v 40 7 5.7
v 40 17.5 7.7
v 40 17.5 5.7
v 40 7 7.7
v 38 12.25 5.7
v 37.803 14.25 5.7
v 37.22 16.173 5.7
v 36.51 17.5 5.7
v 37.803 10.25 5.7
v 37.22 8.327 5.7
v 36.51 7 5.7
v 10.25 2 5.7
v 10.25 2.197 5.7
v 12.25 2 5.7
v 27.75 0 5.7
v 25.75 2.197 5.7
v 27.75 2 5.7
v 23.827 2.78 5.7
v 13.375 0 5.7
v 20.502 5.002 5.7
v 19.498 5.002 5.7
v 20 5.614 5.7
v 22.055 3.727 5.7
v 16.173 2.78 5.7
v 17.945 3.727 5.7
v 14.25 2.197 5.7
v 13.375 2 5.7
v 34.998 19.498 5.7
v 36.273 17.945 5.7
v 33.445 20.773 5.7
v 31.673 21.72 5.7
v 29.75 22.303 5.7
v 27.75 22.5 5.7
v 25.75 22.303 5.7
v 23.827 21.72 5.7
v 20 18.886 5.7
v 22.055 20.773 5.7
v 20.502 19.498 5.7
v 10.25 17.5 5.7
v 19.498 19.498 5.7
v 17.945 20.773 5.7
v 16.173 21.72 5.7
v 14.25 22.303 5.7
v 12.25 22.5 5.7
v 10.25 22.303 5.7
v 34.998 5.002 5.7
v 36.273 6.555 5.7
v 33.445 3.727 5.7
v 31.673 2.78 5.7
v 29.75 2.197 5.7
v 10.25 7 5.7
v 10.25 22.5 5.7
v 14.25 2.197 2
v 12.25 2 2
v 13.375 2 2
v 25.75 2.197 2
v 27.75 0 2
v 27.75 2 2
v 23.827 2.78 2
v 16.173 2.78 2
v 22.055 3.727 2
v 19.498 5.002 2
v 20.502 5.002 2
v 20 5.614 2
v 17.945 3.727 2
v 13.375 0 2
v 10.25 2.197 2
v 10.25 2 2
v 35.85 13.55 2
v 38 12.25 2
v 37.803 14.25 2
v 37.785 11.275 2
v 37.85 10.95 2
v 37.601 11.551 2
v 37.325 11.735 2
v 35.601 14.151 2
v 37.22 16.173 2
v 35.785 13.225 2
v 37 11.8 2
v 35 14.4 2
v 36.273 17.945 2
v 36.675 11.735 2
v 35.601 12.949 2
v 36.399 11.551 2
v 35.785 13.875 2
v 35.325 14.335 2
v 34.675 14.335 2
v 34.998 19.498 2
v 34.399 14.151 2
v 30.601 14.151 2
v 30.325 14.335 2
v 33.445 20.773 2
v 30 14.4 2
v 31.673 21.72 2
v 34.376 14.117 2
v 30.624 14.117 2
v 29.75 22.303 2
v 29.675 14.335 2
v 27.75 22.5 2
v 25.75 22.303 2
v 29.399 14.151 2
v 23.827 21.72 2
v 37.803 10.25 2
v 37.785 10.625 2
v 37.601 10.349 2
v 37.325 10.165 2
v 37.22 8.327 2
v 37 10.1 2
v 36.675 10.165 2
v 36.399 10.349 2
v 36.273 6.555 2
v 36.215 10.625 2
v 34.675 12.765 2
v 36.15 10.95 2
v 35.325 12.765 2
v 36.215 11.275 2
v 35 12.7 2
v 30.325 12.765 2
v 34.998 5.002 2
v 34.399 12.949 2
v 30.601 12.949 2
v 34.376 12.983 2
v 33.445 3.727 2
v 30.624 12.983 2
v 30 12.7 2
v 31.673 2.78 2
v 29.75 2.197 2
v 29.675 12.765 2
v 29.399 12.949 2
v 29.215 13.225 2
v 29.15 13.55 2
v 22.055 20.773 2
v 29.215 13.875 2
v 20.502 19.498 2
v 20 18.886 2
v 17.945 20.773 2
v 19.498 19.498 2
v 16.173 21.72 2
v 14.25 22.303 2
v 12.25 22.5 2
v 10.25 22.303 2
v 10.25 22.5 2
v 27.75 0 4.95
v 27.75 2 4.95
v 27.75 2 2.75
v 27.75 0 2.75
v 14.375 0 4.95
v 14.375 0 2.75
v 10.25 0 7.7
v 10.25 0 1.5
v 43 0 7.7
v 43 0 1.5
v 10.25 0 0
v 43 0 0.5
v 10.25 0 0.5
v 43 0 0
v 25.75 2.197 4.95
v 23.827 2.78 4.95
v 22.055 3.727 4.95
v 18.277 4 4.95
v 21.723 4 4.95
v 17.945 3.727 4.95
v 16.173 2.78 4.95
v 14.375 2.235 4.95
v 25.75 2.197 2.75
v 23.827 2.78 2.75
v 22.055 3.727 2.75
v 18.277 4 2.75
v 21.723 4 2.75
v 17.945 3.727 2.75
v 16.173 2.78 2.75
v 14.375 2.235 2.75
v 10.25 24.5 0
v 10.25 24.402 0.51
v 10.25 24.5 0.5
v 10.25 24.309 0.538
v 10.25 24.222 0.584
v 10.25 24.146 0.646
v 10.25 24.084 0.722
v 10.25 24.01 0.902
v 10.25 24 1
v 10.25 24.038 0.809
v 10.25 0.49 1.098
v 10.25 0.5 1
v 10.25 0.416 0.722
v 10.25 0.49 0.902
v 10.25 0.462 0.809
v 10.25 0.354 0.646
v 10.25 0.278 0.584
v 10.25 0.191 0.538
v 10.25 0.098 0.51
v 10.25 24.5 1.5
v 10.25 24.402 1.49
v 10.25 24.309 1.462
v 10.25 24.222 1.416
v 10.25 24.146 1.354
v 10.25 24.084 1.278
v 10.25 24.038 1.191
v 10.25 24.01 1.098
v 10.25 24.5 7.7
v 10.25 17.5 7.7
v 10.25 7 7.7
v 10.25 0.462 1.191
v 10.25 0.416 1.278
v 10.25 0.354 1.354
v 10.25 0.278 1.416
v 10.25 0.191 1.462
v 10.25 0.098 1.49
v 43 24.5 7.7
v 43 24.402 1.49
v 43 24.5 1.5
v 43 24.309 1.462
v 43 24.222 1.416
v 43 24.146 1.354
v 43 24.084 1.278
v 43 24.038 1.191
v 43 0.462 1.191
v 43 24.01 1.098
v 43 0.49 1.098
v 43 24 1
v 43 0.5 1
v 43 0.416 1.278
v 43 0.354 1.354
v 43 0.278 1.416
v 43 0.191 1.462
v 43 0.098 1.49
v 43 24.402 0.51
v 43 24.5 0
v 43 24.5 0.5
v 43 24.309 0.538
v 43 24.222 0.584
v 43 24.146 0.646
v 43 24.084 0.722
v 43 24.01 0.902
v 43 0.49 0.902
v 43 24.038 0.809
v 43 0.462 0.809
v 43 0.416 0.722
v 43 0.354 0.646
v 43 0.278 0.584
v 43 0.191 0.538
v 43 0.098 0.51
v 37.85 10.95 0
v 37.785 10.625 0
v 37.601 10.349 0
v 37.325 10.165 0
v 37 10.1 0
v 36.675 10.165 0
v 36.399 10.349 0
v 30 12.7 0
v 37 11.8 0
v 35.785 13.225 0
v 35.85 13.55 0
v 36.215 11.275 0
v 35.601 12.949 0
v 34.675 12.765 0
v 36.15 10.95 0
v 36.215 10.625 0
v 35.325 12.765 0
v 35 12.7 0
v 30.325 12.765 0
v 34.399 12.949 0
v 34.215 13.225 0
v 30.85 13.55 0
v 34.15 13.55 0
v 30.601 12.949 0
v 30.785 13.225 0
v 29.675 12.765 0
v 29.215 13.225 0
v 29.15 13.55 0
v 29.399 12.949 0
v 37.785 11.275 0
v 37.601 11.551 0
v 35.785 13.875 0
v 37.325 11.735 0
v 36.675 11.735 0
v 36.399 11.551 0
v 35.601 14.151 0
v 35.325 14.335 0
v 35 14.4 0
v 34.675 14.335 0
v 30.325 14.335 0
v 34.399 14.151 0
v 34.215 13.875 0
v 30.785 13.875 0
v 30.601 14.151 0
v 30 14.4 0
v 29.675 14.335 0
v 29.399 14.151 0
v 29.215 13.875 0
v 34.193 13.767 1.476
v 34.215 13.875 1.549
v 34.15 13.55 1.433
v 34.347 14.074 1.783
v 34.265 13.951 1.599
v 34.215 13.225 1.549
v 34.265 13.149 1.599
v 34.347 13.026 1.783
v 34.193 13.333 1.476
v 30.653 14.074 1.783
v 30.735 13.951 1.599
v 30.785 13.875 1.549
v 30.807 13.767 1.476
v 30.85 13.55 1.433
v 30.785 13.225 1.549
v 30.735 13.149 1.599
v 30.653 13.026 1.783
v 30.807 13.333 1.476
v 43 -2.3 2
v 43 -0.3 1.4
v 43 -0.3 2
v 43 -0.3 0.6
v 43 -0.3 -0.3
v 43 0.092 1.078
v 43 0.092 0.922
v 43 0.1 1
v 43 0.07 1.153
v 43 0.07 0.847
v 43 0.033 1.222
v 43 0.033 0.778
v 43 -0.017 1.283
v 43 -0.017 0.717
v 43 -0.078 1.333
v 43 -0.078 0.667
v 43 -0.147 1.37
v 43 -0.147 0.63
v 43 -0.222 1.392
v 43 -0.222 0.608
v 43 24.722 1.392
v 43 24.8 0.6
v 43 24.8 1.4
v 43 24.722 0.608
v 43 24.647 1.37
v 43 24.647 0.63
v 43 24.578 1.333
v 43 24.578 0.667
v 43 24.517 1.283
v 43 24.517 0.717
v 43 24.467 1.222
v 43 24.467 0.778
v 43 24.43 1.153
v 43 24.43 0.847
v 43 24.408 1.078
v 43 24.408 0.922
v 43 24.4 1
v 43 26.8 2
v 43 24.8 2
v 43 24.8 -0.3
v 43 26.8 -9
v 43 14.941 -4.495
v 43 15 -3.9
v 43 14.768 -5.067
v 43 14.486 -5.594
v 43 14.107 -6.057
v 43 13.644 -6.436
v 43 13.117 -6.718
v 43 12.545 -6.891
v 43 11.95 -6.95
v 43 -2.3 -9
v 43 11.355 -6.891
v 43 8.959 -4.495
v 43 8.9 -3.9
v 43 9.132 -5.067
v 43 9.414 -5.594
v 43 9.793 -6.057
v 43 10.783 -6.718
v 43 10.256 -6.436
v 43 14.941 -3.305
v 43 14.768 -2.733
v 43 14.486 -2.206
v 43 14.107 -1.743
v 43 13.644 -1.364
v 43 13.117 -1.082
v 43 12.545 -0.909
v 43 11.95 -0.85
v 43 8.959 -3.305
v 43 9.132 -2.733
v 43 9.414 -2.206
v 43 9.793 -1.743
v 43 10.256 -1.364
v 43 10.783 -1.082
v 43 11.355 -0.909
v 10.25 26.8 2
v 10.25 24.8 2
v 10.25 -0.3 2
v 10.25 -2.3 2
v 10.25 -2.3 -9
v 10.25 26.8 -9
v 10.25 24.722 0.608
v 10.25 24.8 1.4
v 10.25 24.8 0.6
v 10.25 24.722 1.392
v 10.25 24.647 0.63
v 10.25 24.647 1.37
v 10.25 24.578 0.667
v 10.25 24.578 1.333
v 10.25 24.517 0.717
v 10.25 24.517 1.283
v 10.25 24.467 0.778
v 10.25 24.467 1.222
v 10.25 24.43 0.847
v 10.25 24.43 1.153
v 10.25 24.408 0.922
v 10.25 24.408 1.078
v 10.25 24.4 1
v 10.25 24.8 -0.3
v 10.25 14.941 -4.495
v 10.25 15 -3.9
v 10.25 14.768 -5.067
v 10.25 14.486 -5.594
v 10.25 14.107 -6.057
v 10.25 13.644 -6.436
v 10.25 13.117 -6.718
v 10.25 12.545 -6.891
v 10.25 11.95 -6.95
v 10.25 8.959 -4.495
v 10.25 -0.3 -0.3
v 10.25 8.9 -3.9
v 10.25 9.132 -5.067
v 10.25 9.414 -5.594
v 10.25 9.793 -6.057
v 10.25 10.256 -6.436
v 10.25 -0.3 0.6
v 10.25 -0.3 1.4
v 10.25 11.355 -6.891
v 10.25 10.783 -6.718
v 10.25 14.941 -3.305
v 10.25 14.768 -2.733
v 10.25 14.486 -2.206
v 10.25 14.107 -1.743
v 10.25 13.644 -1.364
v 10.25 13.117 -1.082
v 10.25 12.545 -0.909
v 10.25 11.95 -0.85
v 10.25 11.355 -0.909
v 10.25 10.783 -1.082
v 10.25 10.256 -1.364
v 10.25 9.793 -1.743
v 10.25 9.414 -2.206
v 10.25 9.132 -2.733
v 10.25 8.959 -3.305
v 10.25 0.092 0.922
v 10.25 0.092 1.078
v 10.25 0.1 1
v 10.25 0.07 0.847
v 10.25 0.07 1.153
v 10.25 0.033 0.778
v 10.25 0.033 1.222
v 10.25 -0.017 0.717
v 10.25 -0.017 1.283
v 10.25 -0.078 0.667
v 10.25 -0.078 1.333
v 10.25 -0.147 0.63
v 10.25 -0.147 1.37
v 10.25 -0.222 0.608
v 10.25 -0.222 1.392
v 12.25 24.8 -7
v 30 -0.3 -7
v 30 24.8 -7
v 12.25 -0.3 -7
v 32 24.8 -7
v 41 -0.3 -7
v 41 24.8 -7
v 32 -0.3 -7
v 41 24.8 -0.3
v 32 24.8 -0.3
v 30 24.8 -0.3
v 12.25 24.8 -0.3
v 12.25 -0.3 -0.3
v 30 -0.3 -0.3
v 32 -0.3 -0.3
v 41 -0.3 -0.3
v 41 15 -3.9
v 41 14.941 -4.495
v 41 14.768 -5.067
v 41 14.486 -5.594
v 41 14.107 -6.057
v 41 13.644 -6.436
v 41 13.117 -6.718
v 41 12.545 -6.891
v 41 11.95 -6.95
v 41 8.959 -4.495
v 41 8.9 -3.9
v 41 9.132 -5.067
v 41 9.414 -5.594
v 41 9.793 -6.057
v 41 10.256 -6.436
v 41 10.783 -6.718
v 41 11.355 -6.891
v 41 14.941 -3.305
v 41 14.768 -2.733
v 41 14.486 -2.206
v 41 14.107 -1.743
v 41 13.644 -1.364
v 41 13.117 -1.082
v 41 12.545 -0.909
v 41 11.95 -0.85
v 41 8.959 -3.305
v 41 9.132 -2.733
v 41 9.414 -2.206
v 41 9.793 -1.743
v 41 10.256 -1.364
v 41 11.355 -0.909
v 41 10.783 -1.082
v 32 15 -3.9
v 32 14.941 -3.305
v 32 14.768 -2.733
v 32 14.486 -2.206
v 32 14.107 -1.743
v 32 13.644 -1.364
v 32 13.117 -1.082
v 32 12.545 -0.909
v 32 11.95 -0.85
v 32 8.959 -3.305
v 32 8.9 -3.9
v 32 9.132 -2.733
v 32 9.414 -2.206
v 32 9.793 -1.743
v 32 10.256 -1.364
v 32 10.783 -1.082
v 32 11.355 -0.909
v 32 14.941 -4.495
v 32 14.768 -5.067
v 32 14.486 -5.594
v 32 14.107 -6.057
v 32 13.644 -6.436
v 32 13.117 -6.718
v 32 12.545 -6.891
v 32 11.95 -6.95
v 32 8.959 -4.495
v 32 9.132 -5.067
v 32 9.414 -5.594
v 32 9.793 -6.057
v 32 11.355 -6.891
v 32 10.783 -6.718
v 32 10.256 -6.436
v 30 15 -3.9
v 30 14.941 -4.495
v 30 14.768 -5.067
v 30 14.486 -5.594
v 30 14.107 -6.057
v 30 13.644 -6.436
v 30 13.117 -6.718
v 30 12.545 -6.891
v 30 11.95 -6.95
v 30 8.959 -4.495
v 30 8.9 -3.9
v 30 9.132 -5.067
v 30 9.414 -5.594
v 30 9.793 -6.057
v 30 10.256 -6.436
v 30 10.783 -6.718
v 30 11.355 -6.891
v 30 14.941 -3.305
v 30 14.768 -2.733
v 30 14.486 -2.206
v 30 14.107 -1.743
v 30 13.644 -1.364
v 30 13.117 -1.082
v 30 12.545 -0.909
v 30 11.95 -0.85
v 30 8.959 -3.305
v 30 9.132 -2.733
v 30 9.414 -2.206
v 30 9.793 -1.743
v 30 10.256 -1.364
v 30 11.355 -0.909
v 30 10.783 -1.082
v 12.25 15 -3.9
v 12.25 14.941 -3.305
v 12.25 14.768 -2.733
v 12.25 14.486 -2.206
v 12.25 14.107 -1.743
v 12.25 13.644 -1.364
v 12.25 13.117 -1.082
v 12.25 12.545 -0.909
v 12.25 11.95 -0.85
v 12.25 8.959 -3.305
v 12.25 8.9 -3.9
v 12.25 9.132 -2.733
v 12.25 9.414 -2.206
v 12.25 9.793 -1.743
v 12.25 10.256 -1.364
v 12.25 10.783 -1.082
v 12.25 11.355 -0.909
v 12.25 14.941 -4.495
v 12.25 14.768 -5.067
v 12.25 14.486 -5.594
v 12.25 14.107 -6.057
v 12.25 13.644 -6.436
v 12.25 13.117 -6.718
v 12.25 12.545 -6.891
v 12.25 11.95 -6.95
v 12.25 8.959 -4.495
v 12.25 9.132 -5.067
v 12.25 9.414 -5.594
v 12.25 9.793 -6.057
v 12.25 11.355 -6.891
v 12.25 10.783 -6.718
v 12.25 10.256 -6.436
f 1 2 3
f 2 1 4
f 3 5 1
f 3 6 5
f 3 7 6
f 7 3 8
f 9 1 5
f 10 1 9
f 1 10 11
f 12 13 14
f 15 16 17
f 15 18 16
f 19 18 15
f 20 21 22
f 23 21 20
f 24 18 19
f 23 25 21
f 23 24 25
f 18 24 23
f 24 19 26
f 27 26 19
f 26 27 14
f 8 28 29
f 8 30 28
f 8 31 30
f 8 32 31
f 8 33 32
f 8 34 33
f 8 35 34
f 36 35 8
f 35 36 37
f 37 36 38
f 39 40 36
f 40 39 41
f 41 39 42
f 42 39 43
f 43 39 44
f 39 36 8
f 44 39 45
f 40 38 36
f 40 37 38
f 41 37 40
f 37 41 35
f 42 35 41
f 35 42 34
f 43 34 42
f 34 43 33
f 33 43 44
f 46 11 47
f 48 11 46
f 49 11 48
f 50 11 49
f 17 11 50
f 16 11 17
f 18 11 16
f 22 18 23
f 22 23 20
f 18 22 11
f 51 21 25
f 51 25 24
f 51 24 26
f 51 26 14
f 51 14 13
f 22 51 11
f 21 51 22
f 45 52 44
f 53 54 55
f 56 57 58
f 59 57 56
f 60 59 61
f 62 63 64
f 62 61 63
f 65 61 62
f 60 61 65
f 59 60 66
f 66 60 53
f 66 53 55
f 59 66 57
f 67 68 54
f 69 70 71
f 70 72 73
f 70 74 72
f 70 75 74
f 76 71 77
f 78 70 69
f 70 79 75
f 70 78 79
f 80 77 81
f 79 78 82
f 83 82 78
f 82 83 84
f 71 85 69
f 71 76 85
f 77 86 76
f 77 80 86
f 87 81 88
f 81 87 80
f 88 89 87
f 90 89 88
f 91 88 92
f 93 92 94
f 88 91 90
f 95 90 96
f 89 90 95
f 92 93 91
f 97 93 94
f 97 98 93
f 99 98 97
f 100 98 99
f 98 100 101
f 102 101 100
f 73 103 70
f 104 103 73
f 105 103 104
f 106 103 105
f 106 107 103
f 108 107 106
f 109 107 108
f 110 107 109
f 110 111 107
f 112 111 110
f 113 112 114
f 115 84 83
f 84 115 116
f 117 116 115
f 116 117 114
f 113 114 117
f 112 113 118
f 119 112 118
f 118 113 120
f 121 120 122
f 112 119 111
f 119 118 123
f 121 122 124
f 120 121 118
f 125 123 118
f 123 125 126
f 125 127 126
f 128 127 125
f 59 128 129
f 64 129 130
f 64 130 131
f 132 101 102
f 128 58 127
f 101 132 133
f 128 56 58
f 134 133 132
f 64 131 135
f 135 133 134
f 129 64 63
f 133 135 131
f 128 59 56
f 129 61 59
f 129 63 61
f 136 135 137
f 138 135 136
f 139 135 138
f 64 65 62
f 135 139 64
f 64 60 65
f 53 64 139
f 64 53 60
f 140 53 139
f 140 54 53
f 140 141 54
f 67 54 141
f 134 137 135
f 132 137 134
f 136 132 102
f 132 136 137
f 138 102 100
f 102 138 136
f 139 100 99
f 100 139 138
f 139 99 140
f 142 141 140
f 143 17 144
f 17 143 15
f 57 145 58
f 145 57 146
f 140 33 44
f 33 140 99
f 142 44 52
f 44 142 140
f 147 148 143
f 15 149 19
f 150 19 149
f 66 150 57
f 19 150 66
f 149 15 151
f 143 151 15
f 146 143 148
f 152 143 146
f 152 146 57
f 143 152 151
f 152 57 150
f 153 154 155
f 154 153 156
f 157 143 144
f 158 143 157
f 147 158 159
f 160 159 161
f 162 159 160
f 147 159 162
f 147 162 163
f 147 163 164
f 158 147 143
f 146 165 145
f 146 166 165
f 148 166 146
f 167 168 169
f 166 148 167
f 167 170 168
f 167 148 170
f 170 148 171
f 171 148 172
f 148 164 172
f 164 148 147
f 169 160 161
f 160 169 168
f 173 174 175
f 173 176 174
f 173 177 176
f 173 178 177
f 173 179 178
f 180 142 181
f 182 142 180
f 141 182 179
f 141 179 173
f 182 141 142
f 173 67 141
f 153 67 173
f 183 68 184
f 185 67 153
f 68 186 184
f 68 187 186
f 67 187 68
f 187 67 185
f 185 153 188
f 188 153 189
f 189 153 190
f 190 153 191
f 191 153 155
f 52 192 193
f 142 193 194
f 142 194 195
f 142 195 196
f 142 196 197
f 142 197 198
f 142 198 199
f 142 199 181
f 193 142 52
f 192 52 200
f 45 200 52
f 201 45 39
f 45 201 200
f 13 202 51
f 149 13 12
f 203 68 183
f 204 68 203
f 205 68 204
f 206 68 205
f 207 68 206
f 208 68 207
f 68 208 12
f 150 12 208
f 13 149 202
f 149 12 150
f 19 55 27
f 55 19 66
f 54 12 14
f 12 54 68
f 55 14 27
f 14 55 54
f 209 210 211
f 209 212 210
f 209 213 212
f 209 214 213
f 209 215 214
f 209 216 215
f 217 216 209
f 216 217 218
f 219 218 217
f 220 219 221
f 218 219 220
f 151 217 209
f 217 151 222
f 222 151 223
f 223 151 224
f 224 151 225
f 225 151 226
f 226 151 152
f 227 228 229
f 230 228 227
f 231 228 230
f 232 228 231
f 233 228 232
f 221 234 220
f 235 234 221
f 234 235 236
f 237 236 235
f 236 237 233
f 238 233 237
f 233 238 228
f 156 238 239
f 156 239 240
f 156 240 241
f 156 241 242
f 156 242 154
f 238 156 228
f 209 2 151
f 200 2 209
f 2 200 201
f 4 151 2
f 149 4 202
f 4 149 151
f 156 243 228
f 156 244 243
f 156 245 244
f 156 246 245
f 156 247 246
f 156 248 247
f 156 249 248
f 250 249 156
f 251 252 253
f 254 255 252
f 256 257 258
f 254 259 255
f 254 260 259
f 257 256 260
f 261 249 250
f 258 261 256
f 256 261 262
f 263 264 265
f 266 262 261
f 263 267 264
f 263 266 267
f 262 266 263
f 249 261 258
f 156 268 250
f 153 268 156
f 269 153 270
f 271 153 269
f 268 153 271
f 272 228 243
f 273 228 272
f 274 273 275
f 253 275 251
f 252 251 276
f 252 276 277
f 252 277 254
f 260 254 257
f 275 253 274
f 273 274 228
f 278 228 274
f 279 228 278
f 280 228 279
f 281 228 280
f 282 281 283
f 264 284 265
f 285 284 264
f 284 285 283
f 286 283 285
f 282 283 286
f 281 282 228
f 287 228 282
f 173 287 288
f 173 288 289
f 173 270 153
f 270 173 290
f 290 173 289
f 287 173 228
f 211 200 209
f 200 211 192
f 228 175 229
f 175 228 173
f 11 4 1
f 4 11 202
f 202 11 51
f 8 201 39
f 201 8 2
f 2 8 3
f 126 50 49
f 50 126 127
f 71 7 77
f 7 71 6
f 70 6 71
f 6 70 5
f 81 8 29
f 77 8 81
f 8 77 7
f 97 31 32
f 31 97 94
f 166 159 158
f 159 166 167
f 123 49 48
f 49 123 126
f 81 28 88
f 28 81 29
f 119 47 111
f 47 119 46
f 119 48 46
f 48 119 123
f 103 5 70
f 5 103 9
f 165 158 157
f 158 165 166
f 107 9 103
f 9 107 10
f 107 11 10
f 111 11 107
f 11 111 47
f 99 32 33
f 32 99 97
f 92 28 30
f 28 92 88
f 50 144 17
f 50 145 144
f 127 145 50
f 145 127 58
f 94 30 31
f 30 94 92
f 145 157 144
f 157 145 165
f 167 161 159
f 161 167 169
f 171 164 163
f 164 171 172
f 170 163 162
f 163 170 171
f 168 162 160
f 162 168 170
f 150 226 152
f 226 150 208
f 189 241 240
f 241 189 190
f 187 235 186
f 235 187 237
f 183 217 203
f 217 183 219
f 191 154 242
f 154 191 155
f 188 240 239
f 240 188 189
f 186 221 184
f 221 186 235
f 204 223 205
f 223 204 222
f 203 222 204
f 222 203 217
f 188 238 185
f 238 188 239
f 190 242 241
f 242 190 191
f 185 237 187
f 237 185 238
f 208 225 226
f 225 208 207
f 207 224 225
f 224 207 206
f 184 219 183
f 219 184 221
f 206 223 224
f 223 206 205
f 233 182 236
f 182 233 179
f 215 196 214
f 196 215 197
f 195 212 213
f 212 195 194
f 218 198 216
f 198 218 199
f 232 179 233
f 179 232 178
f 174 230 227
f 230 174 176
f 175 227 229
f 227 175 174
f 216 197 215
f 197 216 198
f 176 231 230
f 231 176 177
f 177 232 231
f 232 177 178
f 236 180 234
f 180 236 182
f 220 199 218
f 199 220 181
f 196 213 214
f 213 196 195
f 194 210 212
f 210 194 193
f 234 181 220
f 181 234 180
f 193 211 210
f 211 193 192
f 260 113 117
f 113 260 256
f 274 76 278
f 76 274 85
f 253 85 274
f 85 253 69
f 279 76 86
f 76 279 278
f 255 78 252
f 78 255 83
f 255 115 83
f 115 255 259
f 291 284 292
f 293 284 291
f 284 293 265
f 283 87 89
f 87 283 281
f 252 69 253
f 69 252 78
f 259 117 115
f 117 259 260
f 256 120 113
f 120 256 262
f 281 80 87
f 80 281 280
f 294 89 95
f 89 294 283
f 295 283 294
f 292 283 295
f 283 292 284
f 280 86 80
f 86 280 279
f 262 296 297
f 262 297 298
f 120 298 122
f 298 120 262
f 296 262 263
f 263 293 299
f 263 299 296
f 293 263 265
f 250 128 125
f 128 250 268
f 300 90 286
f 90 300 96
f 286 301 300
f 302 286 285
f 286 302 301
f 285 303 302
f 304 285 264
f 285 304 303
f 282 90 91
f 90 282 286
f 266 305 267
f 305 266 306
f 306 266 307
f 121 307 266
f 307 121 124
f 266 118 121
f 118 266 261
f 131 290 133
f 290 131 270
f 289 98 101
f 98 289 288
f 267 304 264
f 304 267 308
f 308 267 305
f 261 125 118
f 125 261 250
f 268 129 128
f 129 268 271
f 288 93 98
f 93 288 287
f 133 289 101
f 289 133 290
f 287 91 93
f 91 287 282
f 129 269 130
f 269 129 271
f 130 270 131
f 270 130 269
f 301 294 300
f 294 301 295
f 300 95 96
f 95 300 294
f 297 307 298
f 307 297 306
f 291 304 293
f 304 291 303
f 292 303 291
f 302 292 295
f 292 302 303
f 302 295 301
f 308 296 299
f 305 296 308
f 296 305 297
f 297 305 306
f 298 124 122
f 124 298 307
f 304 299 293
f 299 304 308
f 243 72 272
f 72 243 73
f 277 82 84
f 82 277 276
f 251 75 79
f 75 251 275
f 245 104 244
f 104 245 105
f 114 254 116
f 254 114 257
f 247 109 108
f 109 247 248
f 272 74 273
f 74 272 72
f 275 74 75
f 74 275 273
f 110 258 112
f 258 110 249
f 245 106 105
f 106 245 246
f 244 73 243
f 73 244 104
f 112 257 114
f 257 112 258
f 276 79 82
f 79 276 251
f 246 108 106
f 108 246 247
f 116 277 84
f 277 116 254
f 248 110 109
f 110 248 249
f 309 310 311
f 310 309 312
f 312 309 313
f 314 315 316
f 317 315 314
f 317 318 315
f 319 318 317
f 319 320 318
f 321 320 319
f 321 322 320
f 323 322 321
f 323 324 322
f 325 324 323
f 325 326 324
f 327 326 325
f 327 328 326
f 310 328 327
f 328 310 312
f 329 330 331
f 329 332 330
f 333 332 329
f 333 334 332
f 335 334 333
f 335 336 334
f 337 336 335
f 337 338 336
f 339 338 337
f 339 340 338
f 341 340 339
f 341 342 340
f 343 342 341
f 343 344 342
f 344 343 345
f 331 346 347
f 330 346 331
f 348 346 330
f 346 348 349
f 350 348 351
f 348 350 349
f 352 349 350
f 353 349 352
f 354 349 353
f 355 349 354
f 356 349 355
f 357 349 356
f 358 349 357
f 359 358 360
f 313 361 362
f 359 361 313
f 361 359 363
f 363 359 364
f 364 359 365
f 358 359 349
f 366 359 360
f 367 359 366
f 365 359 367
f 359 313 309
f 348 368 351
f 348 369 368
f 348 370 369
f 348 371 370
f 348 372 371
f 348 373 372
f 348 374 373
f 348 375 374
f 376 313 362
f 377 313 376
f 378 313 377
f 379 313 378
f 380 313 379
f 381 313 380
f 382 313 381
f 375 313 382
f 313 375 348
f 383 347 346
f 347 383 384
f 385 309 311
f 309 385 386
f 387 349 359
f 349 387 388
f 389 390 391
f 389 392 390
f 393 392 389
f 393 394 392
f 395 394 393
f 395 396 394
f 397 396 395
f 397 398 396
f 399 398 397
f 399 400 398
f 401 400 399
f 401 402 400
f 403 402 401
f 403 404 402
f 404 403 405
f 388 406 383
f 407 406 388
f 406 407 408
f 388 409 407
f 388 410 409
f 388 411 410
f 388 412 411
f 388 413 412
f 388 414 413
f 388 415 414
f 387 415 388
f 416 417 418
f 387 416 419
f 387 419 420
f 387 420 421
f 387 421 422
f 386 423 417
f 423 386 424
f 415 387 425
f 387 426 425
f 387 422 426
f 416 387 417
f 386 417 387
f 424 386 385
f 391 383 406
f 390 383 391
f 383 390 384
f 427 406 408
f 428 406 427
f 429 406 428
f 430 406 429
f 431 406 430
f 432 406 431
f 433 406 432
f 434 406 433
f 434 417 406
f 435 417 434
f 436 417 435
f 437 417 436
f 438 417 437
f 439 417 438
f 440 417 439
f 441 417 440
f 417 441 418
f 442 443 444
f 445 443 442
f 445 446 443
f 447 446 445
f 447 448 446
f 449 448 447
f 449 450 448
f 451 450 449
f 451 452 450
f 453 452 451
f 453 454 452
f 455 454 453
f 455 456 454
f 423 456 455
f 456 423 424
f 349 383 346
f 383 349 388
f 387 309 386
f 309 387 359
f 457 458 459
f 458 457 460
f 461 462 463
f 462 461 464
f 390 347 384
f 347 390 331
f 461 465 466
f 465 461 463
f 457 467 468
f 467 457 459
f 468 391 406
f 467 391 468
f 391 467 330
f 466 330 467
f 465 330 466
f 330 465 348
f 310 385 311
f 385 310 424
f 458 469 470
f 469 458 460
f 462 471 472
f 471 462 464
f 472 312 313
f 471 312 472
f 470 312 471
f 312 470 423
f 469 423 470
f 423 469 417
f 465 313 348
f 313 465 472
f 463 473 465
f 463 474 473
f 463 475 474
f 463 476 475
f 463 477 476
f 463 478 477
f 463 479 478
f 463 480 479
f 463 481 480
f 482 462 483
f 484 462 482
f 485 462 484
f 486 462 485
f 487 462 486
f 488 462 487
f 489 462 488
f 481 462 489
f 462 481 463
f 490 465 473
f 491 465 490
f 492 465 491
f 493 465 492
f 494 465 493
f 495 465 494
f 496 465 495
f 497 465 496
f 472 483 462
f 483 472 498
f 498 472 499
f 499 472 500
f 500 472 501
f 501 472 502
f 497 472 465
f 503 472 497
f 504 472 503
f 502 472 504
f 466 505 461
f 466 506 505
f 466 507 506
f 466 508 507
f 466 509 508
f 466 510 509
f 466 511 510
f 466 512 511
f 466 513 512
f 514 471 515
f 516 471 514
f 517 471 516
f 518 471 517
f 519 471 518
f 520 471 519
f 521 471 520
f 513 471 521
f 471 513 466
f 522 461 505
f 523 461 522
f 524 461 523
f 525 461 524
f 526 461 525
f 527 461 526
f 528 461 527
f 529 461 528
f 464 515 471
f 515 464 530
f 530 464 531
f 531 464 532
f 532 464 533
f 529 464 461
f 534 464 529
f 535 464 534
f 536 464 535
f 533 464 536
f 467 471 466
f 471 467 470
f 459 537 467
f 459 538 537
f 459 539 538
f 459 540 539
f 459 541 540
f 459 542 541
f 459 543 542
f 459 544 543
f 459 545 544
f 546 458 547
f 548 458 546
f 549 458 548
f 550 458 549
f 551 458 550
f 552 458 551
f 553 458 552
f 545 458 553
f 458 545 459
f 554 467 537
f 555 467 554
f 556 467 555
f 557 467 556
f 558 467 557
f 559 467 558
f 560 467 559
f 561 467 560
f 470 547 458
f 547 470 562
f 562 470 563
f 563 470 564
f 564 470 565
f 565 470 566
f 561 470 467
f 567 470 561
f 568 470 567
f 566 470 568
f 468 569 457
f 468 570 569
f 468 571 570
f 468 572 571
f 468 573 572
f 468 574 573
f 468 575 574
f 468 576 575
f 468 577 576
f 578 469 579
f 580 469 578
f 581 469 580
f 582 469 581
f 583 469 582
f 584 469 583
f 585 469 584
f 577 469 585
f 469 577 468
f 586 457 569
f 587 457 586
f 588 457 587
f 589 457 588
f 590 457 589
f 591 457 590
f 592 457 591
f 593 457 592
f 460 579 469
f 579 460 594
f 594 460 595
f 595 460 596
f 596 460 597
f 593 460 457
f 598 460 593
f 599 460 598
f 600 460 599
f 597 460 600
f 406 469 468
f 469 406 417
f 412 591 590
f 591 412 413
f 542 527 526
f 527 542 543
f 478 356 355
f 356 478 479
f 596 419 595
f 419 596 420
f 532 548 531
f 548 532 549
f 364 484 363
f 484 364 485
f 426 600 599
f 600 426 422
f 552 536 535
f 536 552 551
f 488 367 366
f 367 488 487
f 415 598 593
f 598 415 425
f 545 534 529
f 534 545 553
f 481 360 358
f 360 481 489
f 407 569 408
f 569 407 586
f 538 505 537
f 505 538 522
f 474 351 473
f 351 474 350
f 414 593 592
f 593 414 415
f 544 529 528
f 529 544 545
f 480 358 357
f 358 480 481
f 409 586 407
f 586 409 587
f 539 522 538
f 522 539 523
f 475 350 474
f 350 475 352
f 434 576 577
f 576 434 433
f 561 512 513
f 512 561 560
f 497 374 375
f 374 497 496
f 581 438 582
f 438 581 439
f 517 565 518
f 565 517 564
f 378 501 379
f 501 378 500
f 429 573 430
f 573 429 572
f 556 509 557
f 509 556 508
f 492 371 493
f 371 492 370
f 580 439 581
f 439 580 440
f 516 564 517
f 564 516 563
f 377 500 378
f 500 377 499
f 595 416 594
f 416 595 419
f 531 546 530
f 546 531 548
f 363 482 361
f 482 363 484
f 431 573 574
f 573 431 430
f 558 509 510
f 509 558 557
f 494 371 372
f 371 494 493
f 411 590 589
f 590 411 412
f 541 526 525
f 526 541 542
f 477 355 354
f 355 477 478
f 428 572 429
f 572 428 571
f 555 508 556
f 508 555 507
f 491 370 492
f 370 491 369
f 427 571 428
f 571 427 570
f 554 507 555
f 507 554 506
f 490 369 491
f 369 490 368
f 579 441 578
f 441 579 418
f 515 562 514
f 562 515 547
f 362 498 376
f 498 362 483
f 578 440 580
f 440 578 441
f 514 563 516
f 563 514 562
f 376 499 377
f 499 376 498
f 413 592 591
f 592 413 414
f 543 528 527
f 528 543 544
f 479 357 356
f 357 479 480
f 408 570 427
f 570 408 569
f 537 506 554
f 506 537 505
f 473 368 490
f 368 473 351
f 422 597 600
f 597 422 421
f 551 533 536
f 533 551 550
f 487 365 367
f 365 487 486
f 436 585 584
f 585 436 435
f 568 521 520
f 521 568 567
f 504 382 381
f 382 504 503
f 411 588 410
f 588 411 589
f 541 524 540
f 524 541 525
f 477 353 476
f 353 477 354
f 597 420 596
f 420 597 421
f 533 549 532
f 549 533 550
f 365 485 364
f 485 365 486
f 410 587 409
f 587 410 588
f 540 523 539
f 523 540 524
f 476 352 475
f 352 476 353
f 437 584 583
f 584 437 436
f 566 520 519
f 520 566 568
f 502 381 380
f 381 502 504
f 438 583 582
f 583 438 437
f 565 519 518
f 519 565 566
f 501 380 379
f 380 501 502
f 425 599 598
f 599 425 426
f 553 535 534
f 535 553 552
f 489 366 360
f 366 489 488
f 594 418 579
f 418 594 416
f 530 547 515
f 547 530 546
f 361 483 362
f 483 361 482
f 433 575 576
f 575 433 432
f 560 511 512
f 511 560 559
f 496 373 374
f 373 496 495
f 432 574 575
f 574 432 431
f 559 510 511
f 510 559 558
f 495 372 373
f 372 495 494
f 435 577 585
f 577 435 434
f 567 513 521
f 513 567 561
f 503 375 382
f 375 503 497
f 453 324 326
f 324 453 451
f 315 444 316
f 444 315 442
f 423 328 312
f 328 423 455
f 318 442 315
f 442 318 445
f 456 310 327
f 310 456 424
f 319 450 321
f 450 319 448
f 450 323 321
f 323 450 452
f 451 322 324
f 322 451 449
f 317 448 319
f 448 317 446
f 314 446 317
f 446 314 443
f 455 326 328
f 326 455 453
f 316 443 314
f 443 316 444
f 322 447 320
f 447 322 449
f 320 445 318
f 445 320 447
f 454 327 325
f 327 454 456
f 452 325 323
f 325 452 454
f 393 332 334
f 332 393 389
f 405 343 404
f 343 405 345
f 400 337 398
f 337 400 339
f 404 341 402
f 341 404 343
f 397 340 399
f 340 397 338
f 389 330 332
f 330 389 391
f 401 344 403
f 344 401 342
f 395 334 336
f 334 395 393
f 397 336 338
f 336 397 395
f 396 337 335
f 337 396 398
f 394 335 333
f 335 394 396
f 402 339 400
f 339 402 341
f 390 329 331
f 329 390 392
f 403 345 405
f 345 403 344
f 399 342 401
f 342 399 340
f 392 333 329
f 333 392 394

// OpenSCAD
wall = 2;
thin_wall = 2;
cell_diam = 20 + 0.5;
cell_thickness = 3.2 + 0.5;
rail_thickness = 5;
snap_thickness = 2;
overlap = 3;
width = 2*cell_diam+wall-overlap;
width_extra = 3;
spacing = 0.75;
first_snap_width = cell_diam/2;
second_snap_width = cell_diam*3/4 - 2;
snap_spacing = 1;
pin_diam = 1.7; // 1.2;

module batteryclip() {
    difference() {
        union() {
            cube([width, cell_diam+2*wall,wall]);
            translate([0,cell_diam+wall,wall]) cube([width, wall, cell_thickness]);
            translate([0,0,cell_thickness+wall]) cube([width, wall+rail_thickness, wall]);
            translate([0, cell_diam+wall-rail_thickness, cell_thickness+wall]) cube([width, wall+rail_thickness, wall]);
            translate([0,0,wall]) {
                translate([width-wall-cell_diam/2,0,0]) cube([wall+cell_diam/2,wall+cell_diam,cell_thickness]);
                translate([width-wall-cell_diam/2-second_snap_width,wall-thin_wall,spacing]) cube([second_snap_width,wall+snap_thickness,cell_thickness-2*spacing]);
                translate([0,wall-thin_wall,spacing]) cube([first_snap_width,wall+snap_thickness, cell_thickness-2*spacing]);
                translate([first_snap_width,0,0]) cube([width-wall-cell_diam/2-second_snap_width-first_snap_width-snap_spacing,wall,cell_thickness]);
                translate([width,0,-wall]) cube([width_extra,cell_diam+2*wall,cell_thickness+2*wall]);
            }
        }
        translate([0,0,wall]) {
            //translate([0,wall+rail_thickness,0]) cube([width,cell_diam-2*rail_thickness,cell_thickness]);
            translate([0,wall+rail_thickness,0]) cube([width-2*wall,cell_diam-2*rail_thickness,cell_thickness]);
            translate([width-wall-cell_diam/2,wall+cell_diam/2,0]) cylinder(h=cell_thickness, d=cell_diam, $fn=32);
            translate([wall+cell_diam/2,wall+cell_diam/2,0]) cylinder(h=cell_thickness, d=cell_diam, $fn=32);
        }
        // Openings for clip
        translate([0,0,1]) rotate([0,90,0]) cylinder(d=1, h=width+width_extra, $fn=32);
        translate([0,cell_diam+2*wall,1]) rotate([0,90,0]) cylinder(d=1, h=width+width_extra, $fn=32);
    }
}


difference() {
    batteryclip();
    // Hole for negative
    translate([width-wall-3,wall+cell_diam/2+1.3,0]) cylinder(d=pin_diam, h=wall, $fn=16);
    translate([width-wall-3-5,wall+cell_diam/2+1.3,0]) cylinder(d=pin_diam, h=wall, $fn=16);
    translate([width-wall-3,wall+cell_diam/2+1.3,wall]) rotate([-90,0,90]) cylinder(d=pin_diam*2/3, h=5, $fn=16);
    // Hole for positive
    translate([width-wall-1,wall+cell_diam/2-1.3,0]) cylinder(d=pin_diam, h=2*wall+cell_thickness, $fn=16);
    // Shortened version
    cube([first_snap_width,cell_diam+2*wall,cell_thickness+2*wall]);
}

tolerance = 0.3;
lid_z = 7;
translate([first_snap_width,-wall-tolerance,-wall-lid_z]) {
    difference() {
        cube([width+width_extra-first_snap_width, cell_diam+4*wall+2*tolerance, wall + 2 + lid_z]);
        translate([0,wall,wall]) cube([width+width_extra-first_snap_width, cell_diam+2*wall+2*tolerance, wall + 2 + lid_z]);
    }
    difference() {
        union() {
            translate([width+width_extra-first_snap_width-wall,0,wall]) cube([wall, cell_diam+4*wall,lid_z-tolerance]);
            translate([width-wall-first_snap_width-3-5,0,wall]) cube([wall, cell_diam+4*wall,lid_z-tolerance]);
            translate([0,0,wall]) cube([wall, cell_diam+4*wall,lid_z-tolerance]);
        }
        translate([0,(cell_diam+4*wall)/2,wall+3.1]) rotate([0,90,0]) cylinder(d=6.1, h=width+10, $fn=32);
    }
    translate([0,wall,lid_z+wall+1]) rotate([0,90,0]) cylinder(d=0.8, h=width+width_extra-first_snap_width, $fn=32);
    translate([0,cell_diam+3*wall+2*tolerance,lid_z+wall+1]) rotate([0,90,0]) cylinder(d=0.8, h=width+width_extra-first_snap_width, $fn=32);
}
